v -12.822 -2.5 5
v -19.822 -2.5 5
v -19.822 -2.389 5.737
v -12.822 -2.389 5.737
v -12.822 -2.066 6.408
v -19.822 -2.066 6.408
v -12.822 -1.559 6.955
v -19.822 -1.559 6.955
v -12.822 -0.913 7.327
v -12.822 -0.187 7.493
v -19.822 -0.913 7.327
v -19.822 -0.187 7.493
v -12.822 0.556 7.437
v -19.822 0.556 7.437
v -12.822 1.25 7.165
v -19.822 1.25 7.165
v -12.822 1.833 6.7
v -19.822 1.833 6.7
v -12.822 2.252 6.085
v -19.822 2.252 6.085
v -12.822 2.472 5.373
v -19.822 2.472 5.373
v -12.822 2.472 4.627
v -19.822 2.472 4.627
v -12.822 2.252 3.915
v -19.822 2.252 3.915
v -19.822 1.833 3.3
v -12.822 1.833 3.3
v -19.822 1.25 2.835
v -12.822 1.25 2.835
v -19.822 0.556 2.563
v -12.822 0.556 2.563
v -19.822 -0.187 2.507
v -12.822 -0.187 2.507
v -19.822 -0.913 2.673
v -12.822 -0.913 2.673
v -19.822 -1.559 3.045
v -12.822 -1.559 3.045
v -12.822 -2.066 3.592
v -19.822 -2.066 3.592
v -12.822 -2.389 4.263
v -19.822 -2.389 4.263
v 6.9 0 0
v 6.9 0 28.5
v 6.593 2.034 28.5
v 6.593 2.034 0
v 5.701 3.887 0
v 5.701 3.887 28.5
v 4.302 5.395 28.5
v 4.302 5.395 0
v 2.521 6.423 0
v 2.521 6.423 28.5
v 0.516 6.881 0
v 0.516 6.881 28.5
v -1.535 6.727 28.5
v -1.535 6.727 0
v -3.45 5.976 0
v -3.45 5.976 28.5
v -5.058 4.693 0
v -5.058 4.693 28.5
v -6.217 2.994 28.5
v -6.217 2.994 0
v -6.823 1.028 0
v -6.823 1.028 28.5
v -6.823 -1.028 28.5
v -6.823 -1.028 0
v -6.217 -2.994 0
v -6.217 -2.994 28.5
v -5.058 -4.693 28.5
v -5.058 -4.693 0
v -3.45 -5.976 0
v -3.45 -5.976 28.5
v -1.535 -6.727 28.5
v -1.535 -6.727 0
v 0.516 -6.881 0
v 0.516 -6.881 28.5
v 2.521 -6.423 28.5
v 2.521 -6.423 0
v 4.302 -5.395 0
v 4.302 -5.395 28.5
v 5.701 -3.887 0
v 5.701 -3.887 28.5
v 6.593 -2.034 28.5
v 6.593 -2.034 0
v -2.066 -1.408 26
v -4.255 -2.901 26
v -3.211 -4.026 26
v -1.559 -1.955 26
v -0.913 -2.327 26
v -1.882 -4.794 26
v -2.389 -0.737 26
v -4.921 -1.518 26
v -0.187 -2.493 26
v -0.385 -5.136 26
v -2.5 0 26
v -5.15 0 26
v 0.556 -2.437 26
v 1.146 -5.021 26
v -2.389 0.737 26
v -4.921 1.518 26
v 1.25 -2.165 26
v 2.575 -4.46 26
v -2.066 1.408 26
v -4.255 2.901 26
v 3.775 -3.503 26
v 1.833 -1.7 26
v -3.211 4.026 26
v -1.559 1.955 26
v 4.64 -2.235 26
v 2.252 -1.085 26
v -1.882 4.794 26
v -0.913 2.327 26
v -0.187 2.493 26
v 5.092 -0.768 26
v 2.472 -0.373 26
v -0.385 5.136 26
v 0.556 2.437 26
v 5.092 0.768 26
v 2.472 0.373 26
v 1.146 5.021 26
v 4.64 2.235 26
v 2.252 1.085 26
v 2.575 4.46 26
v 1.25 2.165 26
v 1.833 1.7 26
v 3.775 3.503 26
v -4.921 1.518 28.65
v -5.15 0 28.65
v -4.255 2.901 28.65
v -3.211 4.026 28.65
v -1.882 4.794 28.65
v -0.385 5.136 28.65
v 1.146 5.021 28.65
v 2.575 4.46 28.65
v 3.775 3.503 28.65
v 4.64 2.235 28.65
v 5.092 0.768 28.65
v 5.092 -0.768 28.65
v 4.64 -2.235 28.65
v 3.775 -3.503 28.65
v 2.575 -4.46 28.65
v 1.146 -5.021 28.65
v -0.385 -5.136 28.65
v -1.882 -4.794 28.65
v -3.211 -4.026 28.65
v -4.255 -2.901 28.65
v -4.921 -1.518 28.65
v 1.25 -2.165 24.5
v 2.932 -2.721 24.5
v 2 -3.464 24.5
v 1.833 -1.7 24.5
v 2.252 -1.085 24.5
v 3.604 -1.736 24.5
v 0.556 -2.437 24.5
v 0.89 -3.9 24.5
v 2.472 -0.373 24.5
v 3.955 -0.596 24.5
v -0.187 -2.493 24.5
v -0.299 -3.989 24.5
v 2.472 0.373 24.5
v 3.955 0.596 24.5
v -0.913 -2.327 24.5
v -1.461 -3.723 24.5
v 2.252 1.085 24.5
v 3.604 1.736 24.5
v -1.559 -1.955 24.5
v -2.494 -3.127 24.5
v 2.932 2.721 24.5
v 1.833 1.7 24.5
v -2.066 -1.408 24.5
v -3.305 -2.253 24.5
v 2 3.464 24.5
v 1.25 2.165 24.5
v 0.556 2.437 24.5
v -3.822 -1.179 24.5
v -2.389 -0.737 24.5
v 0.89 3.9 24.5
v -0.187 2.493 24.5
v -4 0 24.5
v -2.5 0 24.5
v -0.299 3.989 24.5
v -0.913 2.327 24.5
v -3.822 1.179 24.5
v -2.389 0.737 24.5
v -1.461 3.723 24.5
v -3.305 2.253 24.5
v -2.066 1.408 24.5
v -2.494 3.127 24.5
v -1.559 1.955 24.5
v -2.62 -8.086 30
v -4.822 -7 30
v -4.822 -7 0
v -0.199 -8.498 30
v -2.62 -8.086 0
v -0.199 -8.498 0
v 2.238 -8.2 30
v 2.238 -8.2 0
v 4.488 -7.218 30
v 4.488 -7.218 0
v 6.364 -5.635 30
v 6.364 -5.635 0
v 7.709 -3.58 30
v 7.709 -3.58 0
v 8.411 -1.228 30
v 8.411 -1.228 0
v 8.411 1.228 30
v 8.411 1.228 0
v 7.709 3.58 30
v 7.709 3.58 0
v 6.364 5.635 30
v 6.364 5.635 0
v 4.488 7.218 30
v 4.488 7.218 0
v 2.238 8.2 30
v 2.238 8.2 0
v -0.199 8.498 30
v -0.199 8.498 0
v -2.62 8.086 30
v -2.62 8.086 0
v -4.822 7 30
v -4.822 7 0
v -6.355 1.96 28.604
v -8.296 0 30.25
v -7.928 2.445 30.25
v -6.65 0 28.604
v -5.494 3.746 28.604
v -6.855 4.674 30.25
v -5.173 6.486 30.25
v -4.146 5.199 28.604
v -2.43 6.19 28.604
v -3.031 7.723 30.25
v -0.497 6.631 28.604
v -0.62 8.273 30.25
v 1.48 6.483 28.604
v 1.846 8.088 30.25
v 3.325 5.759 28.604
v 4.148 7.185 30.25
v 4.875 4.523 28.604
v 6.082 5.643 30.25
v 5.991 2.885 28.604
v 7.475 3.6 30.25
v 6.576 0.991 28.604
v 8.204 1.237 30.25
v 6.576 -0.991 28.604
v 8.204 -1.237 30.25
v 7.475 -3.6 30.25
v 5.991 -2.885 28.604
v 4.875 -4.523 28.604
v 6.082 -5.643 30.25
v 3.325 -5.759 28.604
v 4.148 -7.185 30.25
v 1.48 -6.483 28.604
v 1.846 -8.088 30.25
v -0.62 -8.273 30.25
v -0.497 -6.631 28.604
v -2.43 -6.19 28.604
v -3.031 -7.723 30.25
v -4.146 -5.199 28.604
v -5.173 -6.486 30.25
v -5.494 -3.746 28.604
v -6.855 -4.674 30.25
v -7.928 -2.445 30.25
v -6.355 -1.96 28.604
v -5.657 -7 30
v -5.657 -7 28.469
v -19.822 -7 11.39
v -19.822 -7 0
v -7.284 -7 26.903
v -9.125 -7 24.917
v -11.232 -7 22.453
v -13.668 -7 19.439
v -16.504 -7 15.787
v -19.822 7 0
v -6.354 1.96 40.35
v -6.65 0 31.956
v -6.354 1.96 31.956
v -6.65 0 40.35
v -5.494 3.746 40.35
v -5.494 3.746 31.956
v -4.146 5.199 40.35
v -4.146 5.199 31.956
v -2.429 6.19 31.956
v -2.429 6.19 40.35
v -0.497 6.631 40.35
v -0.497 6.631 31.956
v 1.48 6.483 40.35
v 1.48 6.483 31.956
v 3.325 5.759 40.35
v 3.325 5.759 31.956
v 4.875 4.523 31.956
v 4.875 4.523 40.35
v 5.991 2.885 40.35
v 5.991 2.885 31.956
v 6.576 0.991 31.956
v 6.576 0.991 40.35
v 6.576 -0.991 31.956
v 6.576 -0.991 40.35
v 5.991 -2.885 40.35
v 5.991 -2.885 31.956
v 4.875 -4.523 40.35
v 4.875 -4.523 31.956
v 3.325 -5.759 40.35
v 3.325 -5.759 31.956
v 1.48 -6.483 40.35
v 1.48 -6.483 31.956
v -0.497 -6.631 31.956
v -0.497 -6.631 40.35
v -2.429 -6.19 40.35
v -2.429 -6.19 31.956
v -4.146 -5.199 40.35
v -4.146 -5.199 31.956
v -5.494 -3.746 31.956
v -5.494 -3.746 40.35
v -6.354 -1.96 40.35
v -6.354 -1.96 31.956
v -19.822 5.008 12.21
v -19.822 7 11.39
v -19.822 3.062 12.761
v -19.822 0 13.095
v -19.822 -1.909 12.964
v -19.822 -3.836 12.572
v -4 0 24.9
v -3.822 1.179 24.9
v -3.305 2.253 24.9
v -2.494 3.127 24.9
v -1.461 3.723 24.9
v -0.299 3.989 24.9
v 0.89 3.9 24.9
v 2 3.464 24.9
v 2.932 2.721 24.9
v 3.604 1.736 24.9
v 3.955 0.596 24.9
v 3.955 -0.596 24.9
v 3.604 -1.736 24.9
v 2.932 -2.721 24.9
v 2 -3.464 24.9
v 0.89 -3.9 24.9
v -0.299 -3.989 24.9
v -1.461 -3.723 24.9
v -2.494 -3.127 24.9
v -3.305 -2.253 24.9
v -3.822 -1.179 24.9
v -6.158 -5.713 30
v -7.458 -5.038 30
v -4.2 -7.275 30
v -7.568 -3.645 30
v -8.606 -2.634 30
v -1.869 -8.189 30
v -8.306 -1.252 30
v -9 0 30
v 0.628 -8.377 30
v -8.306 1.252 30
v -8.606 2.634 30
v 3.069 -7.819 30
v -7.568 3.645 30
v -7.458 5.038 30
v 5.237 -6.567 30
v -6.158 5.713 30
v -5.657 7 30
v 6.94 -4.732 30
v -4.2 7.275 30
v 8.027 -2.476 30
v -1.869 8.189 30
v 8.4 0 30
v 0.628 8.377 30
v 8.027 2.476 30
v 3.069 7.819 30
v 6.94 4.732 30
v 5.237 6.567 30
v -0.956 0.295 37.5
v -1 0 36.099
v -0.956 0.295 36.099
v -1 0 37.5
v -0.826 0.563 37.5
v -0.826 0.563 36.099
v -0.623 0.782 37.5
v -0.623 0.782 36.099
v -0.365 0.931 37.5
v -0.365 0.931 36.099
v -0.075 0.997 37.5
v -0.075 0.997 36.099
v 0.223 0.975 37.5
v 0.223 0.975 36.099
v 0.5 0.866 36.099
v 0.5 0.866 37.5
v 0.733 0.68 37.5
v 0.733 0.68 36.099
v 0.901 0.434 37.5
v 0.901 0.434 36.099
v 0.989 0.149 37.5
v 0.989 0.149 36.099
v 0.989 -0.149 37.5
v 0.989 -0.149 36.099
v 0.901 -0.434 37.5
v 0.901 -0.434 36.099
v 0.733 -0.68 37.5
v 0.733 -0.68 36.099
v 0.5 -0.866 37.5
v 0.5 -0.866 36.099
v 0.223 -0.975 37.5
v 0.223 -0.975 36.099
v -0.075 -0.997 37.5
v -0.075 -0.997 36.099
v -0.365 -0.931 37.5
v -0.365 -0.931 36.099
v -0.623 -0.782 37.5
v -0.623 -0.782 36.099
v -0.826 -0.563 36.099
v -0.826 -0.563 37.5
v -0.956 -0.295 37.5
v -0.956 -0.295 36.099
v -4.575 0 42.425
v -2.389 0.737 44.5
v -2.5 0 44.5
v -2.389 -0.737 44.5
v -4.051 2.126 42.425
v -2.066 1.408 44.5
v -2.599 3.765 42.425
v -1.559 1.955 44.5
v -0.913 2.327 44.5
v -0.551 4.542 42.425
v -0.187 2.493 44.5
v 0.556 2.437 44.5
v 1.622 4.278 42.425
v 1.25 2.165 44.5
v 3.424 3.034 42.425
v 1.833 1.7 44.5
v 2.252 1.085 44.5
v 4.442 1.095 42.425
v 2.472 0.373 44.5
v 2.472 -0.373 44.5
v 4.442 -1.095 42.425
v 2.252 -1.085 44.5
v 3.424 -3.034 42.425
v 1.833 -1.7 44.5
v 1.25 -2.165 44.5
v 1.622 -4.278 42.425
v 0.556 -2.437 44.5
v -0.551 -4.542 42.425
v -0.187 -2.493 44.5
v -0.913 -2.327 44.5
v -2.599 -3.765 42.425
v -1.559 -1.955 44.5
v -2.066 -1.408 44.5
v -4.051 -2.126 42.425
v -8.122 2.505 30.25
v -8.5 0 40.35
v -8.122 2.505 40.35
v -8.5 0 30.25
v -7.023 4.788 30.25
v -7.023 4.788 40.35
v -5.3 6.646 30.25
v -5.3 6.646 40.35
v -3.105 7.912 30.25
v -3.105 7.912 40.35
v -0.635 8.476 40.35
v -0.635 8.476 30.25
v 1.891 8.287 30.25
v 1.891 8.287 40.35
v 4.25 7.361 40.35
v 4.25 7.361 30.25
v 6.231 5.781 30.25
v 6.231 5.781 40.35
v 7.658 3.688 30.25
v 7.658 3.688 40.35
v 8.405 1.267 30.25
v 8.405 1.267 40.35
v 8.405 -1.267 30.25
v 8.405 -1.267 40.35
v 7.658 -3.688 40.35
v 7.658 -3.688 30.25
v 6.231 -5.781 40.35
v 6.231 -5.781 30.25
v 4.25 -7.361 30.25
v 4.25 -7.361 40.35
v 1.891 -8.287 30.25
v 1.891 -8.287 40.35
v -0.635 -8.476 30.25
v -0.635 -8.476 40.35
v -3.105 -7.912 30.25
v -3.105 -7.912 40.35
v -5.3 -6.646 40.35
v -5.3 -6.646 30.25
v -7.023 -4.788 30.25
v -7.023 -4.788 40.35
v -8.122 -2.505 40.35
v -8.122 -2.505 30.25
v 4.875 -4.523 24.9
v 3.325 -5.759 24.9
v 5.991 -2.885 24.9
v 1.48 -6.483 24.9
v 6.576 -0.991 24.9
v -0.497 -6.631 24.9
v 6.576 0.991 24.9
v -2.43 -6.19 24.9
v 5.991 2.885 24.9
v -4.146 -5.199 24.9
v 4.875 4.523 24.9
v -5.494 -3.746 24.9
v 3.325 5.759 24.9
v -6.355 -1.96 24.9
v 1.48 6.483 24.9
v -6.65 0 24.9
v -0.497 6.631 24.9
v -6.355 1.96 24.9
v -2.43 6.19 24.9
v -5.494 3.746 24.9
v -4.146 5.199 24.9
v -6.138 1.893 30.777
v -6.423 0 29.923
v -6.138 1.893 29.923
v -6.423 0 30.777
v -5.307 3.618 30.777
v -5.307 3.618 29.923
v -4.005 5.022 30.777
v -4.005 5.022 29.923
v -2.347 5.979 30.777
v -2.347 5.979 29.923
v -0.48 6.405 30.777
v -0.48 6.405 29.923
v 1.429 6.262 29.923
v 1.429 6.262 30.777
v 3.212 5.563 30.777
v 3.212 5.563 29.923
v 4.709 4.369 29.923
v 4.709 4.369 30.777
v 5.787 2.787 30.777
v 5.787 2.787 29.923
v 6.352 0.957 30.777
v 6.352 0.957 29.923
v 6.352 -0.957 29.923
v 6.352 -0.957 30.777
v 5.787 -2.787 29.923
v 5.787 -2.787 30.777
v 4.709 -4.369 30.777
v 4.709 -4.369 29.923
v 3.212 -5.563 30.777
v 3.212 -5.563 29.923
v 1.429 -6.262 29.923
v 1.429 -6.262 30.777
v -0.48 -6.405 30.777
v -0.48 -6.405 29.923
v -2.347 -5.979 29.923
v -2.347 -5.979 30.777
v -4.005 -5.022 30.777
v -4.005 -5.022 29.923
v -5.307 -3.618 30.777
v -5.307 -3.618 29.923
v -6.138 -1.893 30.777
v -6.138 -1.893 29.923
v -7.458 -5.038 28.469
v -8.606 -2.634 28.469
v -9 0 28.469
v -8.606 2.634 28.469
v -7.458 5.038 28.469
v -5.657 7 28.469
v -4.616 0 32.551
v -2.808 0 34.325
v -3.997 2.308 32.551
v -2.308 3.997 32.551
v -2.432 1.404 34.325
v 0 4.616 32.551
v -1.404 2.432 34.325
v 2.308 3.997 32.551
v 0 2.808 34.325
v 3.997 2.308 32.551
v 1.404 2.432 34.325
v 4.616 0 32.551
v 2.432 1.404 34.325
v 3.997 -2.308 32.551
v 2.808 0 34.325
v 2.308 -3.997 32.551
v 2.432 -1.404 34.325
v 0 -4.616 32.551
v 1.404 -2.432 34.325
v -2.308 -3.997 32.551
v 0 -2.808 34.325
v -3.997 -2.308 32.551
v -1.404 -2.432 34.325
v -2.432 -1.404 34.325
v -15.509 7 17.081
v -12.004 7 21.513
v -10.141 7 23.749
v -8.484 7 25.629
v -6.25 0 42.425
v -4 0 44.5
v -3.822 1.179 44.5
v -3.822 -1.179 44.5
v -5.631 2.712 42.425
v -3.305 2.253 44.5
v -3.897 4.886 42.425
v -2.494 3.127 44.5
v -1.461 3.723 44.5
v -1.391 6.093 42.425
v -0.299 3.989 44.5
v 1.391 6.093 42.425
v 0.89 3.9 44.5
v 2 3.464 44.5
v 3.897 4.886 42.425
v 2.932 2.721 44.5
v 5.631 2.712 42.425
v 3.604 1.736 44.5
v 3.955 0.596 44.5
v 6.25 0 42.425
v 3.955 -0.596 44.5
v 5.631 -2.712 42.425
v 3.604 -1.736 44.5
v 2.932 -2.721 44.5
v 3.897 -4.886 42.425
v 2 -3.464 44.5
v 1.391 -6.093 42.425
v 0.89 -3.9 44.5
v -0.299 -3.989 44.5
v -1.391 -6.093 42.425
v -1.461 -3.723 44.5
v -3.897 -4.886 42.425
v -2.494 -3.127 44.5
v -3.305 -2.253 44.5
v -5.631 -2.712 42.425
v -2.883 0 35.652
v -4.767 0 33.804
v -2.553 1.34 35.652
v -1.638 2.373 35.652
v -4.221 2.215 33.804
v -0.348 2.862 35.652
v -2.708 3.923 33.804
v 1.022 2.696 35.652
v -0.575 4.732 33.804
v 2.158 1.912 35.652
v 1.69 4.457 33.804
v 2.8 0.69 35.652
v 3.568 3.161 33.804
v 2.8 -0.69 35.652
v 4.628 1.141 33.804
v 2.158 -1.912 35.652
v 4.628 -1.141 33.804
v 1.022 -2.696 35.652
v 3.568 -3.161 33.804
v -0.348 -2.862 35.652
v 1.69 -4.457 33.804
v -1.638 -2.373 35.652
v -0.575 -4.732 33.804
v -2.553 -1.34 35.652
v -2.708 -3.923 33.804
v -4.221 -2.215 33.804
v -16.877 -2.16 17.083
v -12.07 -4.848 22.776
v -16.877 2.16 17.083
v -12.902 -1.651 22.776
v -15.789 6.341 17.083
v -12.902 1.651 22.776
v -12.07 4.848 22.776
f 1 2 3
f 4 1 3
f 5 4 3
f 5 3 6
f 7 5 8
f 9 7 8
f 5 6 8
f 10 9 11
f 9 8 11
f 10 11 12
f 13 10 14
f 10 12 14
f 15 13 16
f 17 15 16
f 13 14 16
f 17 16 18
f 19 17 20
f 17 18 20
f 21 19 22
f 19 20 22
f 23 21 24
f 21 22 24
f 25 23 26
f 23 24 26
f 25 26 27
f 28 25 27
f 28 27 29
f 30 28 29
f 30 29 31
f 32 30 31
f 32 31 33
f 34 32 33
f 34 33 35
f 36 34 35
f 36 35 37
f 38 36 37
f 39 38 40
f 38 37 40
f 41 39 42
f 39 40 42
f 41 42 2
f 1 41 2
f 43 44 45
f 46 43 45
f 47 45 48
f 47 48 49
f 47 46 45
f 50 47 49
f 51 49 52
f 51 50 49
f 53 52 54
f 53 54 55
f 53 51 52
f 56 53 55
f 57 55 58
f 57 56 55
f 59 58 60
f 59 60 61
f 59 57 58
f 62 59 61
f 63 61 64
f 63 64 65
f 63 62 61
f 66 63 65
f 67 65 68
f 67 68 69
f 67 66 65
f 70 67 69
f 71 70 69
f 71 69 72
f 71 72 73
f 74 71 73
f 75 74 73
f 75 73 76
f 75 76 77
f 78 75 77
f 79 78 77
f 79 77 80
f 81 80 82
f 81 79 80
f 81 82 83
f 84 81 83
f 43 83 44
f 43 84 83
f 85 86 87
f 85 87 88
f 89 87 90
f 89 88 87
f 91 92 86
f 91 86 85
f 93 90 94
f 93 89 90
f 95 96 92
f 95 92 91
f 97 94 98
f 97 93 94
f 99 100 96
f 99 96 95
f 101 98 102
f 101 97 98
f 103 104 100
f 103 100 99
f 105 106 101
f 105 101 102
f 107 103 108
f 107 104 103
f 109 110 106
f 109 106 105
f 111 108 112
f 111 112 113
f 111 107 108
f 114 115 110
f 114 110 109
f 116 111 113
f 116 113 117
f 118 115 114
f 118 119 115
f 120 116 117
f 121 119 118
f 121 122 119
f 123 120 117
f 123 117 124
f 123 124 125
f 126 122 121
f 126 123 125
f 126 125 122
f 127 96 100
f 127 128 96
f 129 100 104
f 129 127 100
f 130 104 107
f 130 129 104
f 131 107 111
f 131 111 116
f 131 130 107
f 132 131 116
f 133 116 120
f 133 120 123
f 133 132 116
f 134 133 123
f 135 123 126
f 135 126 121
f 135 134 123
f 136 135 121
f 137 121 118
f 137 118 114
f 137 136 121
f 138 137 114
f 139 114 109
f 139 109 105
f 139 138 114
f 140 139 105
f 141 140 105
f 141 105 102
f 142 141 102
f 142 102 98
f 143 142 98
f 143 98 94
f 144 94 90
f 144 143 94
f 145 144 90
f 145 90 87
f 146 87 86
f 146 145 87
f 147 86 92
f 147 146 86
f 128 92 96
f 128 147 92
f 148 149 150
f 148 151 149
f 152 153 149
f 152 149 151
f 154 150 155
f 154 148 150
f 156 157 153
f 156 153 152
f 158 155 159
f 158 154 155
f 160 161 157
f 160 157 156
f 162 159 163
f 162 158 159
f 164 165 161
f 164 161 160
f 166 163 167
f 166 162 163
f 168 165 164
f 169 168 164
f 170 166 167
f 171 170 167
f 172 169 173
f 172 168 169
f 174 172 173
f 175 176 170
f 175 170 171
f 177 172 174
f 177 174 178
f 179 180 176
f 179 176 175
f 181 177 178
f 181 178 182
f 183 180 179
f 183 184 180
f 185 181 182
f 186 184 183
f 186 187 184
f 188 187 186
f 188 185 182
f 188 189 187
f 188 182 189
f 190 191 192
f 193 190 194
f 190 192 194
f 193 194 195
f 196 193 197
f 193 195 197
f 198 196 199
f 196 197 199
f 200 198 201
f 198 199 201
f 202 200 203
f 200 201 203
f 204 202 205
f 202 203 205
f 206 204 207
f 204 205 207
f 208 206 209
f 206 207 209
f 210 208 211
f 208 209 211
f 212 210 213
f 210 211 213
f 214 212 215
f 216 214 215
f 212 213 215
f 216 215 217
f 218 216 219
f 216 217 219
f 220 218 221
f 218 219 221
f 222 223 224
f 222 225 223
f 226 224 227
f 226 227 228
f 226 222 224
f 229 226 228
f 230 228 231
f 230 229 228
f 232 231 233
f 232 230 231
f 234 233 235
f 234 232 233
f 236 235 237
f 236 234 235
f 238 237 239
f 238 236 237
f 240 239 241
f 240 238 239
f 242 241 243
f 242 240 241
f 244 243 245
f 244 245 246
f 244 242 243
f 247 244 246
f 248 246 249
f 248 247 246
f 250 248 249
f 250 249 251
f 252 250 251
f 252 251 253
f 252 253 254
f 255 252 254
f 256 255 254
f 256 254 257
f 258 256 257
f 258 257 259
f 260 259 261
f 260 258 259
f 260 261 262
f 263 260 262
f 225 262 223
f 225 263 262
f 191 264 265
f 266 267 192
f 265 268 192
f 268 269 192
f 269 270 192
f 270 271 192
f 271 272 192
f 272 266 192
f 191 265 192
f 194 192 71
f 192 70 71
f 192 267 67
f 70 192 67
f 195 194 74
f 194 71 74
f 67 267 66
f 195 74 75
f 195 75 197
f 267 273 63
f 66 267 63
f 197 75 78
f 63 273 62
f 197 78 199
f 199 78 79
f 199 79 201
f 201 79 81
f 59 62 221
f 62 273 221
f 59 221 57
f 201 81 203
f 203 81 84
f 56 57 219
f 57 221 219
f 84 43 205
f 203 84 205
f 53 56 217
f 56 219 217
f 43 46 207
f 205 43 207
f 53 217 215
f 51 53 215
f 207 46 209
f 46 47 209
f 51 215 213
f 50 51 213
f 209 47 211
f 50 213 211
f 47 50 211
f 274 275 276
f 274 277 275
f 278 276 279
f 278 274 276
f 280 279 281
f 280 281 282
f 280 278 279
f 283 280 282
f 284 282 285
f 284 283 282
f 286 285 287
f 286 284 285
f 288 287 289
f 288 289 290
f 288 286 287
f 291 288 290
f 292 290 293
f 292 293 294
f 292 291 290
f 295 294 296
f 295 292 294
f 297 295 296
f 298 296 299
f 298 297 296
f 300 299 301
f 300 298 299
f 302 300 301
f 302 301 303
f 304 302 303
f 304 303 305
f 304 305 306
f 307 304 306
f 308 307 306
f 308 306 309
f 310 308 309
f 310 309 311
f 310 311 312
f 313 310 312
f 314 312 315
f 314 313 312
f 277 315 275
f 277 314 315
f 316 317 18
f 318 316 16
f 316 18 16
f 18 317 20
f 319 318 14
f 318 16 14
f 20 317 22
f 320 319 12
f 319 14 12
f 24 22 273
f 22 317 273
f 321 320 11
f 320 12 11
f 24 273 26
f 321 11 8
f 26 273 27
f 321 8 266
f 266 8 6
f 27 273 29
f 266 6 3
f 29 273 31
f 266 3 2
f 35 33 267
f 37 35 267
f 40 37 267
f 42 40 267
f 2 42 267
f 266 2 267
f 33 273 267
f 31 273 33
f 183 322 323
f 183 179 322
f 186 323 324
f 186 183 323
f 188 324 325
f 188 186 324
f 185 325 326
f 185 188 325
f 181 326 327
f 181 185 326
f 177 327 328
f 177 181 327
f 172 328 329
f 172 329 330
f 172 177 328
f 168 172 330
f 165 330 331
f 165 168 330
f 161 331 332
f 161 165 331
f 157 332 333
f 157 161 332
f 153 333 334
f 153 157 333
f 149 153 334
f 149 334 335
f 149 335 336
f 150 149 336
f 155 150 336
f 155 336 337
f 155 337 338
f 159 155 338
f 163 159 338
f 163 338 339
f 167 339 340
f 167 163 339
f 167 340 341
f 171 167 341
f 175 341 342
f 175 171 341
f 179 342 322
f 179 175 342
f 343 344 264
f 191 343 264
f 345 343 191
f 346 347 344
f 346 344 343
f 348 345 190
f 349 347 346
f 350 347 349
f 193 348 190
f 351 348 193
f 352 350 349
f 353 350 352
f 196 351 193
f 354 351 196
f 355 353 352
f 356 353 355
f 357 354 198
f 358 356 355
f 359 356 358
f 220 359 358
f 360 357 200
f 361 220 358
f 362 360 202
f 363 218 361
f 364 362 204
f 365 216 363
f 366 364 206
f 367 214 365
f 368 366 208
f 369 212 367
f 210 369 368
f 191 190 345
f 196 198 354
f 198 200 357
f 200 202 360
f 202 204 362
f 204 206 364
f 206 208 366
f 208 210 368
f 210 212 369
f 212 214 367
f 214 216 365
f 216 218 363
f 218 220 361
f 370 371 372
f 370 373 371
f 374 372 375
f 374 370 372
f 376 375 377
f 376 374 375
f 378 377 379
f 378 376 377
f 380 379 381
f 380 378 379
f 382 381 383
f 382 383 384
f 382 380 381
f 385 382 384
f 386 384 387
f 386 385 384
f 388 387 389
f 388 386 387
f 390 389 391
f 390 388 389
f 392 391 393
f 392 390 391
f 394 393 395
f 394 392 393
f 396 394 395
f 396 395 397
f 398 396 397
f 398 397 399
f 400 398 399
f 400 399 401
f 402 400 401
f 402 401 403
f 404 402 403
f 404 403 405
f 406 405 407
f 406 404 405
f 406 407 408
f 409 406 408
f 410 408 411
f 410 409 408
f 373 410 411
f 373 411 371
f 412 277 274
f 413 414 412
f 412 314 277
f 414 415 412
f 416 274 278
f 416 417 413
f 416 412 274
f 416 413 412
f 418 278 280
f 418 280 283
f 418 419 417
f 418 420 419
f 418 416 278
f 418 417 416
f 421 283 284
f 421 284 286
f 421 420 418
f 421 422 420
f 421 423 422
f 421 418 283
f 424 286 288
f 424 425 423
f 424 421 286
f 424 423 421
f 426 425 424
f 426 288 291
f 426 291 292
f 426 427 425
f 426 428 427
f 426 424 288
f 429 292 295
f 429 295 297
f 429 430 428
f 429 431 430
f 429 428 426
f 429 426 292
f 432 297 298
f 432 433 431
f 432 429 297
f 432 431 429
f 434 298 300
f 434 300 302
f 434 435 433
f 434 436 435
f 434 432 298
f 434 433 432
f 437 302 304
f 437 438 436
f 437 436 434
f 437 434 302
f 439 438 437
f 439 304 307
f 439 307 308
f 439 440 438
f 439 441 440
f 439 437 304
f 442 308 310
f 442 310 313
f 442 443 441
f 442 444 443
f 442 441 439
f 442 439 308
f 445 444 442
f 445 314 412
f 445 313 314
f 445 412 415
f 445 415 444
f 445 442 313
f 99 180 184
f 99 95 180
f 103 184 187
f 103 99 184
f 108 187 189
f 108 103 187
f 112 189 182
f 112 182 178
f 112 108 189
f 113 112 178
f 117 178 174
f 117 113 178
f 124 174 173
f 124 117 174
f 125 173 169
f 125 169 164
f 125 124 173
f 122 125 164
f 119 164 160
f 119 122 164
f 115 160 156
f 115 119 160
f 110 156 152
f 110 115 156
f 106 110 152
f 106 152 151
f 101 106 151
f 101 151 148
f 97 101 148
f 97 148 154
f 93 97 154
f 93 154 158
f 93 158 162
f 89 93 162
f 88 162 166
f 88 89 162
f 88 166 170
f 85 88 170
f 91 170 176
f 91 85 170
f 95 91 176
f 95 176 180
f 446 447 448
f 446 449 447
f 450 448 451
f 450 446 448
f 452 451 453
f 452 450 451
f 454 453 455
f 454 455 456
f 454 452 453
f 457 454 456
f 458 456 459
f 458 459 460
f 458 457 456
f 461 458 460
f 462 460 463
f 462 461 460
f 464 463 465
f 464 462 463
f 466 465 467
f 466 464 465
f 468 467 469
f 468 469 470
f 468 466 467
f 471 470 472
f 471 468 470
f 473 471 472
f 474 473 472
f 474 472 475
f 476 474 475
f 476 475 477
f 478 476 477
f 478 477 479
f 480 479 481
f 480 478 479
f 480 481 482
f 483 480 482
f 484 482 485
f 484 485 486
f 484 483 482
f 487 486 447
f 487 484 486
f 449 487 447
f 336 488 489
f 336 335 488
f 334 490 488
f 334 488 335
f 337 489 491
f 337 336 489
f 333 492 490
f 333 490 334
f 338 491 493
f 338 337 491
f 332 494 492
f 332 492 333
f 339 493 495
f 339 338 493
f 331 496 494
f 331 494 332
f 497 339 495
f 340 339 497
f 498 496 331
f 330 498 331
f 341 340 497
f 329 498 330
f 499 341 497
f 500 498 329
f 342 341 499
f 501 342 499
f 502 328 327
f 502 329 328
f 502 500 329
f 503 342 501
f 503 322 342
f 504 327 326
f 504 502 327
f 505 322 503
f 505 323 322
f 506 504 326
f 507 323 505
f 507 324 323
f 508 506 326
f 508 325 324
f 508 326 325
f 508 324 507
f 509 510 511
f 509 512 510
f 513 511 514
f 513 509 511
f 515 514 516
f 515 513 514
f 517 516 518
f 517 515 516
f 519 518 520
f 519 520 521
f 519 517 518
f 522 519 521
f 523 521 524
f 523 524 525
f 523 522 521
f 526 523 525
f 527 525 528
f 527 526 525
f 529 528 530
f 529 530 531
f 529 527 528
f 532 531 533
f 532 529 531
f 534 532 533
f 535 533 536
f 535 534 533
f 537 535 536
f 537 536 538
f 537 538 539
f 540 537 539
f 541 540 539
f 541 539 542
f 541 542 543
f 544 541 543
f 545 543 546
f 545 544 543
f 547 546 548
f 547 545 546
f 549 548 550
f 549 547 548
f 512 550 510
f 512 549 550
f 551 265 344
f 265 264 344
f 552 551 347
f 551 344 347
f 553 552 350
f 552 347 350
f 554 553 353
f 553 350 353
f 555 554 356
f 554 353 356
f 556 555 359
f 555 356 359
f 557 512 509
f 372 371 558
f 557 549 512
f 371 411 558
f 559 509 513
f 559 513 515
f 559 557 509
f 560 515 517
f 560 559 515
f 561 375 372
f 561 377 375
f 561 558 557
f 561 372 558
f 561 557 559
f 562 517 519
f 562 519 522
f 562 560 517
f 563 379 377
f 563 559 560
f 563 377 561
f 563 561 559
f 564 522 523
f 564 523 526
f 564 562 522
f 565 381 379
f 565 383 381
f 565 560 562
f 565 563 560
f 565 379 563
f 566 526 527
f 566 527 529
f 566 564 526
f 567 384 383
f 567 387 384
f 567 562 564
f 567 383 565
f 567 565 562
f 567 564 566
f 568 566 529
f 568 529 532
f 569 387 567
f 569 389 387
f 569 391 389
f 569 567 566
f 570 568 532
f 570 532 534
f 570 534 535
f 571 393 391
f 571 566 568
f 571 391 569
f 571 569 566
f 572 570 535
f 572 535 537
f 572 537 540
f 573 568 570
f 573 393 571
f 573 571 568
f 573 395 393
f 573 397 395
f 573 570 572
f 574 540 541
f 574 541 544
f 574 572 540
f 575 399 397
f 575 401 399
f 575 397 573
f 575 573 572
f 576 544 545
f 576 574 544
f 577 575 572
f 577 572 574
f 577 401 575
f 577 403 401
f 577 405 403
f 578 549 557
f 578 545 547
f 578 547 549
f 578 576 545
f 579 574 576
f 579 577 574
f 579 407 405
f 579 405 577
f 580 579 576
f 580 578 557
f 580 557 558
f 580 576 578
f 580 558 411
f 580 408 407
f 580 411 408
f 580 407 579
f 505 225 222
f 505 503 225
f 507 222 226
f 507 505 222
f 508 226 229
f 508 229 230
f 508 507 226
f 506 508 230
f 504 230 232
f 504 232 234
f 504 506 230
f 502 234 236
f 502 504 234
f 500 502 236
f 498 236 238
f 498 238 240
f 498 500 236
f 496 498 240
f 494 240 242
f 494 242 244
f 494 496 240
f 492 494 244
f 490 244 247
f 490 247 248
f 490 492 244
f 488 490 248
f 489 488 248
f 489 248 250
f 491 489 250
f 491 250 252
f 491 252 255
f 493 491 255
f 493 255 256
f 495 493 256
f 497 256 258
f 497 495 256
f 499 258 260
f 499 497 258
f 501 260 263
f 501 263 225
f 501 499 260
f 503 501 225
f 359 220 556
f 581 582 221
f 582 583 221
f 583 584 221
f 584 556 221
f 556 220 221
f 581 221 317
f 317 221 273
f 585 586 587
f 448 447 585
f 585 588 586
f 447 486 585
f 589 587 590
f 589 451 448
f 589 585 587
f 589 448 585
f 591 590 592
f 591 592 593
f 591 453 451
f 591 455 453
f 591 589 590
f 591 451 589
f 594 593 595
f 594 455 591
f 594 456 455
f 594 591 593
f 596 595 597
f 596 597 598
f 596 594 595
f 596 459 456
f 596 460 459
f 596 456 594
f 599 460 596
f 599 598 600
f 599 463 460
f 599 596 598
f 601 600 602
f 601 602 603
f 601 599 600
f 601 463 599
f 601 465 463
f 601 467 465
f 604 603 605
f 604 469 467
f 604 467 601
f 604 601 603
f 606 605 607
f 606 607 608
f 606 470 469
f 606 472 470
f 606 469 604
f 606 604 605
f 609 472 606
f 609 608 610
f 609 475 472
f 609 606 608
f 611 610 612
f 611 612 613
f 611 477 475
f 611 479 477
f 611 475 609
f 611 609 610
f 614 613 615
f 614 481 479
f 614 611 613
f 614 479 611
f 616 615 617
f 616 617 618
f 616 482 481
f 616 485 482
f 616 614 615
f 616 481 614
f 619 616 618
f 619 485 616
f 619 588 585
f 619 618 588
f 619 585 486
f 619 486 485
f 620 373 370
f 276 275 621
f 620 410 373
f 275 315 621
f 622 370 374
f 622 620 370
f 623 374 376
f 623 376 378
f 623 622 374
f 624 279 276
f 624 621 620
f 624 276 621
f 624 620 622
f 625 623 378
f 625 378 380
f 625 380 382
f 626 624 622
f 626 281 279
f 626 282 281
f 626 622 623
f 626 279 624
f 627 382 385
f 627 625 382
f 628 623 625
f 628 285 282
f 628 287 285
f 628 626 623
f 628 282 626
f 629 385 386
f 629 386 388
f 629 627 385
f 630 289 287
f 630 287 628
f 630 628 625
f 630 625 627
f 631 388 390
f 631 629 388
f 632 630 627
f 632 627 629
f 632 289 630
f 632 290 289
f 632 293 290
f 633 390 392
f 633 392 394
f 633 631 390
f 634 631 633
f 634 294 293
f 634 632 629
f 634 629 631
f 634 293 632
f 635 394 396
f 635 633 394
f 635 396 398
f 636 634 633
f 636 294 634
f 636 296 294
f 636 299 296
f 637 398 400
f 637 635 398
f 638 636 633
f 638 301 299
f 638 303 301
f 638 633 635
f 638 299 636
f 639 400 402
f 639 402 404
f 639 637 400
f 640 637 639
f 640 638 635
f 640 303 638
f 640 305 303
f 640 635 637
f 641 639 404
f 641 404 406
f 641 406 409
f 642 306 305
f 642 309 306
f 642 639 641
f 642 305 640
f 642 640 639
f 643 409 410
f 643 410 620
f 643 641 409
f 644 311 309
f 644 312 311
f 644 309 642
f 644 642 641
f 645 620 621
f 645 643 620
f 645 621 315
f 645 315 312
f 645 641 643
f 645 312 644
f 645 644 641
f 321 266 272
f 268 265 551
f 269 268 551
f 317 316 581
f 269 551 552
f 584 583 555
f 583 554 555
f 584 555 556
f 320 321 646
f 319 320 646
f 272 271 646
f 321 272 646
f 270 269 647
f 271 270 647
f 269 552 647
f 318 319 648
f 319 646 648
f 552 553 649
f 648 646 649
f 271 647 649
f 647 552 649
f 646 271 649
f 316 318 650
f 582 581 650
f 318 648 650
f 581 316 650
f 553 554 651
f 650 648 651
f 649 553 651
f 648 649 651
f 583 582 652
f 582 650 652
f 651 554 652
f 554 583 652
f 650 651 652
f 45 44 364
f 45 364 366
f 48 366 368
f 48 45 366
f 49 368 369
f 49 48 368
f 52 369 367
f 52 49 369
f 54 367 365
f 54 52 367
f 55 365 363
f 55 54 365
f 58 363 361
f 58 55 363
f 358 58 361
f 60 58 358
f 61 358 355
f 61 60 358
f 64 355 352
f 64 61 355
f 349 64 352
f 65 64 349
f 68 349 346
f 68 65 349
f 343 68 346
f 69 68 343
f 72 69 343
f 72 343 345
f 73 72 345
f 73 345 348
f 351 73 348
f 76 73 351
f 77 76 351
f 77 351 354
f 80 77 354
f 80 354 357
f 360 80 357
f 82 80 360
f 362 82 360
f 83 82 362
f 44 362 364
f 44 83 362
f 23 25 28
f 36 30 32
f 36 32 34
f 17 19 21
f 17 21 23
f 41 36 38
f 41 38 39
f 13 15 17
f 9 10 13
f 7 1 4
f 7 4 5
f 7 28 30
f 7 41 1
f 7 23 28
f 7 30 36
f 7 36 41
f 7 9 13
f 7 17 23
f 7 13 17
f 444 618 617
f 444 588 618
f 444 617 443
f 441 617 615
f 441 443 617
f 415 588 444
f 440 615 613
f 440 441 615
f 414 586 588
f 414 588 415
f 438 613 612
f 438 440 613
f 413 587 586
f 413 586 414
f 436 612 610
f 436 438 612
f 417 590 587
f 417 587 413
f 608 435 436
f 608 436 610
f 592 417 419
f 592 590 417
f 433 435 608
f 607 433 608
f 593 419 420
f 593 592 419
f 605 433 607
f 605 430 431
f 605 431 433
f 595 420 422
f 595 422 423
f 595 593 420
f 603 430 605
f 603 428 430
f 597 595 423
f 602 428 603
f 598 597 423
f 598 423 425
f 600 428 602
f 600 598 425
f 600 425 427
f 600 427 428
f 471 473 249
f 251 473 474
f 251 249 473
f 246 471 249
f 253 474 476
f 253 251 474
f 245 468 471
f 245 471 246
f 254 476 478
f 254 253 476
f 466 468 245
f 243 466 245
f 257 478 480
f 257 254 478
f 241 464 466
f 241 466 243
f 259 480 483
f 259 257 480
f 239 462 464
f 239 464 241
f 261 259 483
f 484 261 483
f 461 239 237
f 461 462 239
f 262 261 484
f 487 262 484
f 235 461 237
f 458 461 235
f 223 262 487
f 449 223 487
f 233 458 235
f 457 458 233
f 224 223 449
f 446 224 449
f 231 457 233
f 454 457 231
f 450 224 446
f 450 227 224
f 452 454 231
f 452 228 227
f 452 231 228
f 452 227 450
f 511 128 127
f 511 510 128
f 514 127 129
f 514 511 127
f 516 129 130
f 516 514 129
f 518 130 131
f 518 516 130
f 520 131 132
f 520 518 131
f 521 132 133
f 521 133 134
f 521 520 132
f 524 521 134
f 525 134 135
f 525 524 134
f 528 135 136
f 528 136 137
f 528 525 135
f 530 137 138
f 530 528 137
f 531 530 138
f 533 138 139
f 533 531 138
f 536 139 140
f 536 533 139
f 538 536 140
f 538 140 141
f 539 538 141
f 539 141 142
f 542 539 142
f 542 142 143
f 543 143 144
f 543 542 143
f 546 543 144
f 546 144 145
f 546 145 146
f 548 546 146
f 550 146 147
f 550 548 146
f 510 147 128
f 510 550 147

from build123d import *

# Parameters (mm, degrees)
F0_R     = 6.9
F1_DEPTH = 30
F2_R     = 2.5
F3_DEPTH = 7
F4_SIZE  = 1.5


with BuildPart() as f1:
    # F0 (on Top) → F1 (new body)
    with BuildSketch(Plane.XY):
        with BuildLine():
            Line((-19.821825, -7), (-4.821825, -7))
            ThreePointArc((-4.821825, -7), (8.5, 0), (-4.821825, 7))
            Line((-4.821825, 7), (-19.821825, 7))
            Line((-19.821825, 7), (-19.821825, -7))
        make_face()
        Circle(F0_R, mode=Mode.SUBTRACT)
    extrude(amount=F1_DEPTH)

    # F2 (on face) → F3 (cut)
    with BuildSketch(Plane(origin=(-19.821825, 0, 0), x_dir=(0, -1, 0), z_dir=(-1, 0, 0))):
        with Locations((0, 5)):
            Circle(F2_R)
    extrude(amount=-F3_DEPTH, mode=Mode.SUBTRACT)

    # F4
    f4_edges = [f1.edges().sort_by_distance(p)[0] for p in [
        (-6.9, 0, 30),
    ]]
    chamfer(f4_edges, length=F4_SIZE)

    # F8 (on Front) → F9 (revolve, cut)
    with BuildSketch(Plane.XZ):
        Polygon((-9, 28.46919), (-9, 31), (-22, 31.653638), (-22, 10), align=None)
    revolve(axis=Axis((0, 0, 22.582859), (0, 0, -1)), mode=Mode.SUBTRACT)


with BuildPart() as f7:
    # F6 (on Front) → F7 (revolve)
    with BuildSketch(Plane.XZ):
        Polygon((-8.296447, 30.25), (-6.65, 28.603553), (-6.65, 24.9), (-4, 24.9), (-4, 24.5), (-2.5, 24.5), (-2.5, 26), (-5.15, 26), (-5.15, 27.333333), (-5.15, 28.65), (-6.423346, 29.923346), (-6.423346, 30.77723), (-1, 36.098971), (-1, 37.5), (-6.649931, 31.955919), (-6.649931, 40.350069), (-2.5, 44.5), (-3.729294, 44.5), (-4, 44.5), (-8.5, 40.350069), (-8.5, 30.25), align=None)
    revolve(axis=Axis((0, 0, 26.077068), (0, 0, -1)))


solid = Compound([f1.part, f7.part])
